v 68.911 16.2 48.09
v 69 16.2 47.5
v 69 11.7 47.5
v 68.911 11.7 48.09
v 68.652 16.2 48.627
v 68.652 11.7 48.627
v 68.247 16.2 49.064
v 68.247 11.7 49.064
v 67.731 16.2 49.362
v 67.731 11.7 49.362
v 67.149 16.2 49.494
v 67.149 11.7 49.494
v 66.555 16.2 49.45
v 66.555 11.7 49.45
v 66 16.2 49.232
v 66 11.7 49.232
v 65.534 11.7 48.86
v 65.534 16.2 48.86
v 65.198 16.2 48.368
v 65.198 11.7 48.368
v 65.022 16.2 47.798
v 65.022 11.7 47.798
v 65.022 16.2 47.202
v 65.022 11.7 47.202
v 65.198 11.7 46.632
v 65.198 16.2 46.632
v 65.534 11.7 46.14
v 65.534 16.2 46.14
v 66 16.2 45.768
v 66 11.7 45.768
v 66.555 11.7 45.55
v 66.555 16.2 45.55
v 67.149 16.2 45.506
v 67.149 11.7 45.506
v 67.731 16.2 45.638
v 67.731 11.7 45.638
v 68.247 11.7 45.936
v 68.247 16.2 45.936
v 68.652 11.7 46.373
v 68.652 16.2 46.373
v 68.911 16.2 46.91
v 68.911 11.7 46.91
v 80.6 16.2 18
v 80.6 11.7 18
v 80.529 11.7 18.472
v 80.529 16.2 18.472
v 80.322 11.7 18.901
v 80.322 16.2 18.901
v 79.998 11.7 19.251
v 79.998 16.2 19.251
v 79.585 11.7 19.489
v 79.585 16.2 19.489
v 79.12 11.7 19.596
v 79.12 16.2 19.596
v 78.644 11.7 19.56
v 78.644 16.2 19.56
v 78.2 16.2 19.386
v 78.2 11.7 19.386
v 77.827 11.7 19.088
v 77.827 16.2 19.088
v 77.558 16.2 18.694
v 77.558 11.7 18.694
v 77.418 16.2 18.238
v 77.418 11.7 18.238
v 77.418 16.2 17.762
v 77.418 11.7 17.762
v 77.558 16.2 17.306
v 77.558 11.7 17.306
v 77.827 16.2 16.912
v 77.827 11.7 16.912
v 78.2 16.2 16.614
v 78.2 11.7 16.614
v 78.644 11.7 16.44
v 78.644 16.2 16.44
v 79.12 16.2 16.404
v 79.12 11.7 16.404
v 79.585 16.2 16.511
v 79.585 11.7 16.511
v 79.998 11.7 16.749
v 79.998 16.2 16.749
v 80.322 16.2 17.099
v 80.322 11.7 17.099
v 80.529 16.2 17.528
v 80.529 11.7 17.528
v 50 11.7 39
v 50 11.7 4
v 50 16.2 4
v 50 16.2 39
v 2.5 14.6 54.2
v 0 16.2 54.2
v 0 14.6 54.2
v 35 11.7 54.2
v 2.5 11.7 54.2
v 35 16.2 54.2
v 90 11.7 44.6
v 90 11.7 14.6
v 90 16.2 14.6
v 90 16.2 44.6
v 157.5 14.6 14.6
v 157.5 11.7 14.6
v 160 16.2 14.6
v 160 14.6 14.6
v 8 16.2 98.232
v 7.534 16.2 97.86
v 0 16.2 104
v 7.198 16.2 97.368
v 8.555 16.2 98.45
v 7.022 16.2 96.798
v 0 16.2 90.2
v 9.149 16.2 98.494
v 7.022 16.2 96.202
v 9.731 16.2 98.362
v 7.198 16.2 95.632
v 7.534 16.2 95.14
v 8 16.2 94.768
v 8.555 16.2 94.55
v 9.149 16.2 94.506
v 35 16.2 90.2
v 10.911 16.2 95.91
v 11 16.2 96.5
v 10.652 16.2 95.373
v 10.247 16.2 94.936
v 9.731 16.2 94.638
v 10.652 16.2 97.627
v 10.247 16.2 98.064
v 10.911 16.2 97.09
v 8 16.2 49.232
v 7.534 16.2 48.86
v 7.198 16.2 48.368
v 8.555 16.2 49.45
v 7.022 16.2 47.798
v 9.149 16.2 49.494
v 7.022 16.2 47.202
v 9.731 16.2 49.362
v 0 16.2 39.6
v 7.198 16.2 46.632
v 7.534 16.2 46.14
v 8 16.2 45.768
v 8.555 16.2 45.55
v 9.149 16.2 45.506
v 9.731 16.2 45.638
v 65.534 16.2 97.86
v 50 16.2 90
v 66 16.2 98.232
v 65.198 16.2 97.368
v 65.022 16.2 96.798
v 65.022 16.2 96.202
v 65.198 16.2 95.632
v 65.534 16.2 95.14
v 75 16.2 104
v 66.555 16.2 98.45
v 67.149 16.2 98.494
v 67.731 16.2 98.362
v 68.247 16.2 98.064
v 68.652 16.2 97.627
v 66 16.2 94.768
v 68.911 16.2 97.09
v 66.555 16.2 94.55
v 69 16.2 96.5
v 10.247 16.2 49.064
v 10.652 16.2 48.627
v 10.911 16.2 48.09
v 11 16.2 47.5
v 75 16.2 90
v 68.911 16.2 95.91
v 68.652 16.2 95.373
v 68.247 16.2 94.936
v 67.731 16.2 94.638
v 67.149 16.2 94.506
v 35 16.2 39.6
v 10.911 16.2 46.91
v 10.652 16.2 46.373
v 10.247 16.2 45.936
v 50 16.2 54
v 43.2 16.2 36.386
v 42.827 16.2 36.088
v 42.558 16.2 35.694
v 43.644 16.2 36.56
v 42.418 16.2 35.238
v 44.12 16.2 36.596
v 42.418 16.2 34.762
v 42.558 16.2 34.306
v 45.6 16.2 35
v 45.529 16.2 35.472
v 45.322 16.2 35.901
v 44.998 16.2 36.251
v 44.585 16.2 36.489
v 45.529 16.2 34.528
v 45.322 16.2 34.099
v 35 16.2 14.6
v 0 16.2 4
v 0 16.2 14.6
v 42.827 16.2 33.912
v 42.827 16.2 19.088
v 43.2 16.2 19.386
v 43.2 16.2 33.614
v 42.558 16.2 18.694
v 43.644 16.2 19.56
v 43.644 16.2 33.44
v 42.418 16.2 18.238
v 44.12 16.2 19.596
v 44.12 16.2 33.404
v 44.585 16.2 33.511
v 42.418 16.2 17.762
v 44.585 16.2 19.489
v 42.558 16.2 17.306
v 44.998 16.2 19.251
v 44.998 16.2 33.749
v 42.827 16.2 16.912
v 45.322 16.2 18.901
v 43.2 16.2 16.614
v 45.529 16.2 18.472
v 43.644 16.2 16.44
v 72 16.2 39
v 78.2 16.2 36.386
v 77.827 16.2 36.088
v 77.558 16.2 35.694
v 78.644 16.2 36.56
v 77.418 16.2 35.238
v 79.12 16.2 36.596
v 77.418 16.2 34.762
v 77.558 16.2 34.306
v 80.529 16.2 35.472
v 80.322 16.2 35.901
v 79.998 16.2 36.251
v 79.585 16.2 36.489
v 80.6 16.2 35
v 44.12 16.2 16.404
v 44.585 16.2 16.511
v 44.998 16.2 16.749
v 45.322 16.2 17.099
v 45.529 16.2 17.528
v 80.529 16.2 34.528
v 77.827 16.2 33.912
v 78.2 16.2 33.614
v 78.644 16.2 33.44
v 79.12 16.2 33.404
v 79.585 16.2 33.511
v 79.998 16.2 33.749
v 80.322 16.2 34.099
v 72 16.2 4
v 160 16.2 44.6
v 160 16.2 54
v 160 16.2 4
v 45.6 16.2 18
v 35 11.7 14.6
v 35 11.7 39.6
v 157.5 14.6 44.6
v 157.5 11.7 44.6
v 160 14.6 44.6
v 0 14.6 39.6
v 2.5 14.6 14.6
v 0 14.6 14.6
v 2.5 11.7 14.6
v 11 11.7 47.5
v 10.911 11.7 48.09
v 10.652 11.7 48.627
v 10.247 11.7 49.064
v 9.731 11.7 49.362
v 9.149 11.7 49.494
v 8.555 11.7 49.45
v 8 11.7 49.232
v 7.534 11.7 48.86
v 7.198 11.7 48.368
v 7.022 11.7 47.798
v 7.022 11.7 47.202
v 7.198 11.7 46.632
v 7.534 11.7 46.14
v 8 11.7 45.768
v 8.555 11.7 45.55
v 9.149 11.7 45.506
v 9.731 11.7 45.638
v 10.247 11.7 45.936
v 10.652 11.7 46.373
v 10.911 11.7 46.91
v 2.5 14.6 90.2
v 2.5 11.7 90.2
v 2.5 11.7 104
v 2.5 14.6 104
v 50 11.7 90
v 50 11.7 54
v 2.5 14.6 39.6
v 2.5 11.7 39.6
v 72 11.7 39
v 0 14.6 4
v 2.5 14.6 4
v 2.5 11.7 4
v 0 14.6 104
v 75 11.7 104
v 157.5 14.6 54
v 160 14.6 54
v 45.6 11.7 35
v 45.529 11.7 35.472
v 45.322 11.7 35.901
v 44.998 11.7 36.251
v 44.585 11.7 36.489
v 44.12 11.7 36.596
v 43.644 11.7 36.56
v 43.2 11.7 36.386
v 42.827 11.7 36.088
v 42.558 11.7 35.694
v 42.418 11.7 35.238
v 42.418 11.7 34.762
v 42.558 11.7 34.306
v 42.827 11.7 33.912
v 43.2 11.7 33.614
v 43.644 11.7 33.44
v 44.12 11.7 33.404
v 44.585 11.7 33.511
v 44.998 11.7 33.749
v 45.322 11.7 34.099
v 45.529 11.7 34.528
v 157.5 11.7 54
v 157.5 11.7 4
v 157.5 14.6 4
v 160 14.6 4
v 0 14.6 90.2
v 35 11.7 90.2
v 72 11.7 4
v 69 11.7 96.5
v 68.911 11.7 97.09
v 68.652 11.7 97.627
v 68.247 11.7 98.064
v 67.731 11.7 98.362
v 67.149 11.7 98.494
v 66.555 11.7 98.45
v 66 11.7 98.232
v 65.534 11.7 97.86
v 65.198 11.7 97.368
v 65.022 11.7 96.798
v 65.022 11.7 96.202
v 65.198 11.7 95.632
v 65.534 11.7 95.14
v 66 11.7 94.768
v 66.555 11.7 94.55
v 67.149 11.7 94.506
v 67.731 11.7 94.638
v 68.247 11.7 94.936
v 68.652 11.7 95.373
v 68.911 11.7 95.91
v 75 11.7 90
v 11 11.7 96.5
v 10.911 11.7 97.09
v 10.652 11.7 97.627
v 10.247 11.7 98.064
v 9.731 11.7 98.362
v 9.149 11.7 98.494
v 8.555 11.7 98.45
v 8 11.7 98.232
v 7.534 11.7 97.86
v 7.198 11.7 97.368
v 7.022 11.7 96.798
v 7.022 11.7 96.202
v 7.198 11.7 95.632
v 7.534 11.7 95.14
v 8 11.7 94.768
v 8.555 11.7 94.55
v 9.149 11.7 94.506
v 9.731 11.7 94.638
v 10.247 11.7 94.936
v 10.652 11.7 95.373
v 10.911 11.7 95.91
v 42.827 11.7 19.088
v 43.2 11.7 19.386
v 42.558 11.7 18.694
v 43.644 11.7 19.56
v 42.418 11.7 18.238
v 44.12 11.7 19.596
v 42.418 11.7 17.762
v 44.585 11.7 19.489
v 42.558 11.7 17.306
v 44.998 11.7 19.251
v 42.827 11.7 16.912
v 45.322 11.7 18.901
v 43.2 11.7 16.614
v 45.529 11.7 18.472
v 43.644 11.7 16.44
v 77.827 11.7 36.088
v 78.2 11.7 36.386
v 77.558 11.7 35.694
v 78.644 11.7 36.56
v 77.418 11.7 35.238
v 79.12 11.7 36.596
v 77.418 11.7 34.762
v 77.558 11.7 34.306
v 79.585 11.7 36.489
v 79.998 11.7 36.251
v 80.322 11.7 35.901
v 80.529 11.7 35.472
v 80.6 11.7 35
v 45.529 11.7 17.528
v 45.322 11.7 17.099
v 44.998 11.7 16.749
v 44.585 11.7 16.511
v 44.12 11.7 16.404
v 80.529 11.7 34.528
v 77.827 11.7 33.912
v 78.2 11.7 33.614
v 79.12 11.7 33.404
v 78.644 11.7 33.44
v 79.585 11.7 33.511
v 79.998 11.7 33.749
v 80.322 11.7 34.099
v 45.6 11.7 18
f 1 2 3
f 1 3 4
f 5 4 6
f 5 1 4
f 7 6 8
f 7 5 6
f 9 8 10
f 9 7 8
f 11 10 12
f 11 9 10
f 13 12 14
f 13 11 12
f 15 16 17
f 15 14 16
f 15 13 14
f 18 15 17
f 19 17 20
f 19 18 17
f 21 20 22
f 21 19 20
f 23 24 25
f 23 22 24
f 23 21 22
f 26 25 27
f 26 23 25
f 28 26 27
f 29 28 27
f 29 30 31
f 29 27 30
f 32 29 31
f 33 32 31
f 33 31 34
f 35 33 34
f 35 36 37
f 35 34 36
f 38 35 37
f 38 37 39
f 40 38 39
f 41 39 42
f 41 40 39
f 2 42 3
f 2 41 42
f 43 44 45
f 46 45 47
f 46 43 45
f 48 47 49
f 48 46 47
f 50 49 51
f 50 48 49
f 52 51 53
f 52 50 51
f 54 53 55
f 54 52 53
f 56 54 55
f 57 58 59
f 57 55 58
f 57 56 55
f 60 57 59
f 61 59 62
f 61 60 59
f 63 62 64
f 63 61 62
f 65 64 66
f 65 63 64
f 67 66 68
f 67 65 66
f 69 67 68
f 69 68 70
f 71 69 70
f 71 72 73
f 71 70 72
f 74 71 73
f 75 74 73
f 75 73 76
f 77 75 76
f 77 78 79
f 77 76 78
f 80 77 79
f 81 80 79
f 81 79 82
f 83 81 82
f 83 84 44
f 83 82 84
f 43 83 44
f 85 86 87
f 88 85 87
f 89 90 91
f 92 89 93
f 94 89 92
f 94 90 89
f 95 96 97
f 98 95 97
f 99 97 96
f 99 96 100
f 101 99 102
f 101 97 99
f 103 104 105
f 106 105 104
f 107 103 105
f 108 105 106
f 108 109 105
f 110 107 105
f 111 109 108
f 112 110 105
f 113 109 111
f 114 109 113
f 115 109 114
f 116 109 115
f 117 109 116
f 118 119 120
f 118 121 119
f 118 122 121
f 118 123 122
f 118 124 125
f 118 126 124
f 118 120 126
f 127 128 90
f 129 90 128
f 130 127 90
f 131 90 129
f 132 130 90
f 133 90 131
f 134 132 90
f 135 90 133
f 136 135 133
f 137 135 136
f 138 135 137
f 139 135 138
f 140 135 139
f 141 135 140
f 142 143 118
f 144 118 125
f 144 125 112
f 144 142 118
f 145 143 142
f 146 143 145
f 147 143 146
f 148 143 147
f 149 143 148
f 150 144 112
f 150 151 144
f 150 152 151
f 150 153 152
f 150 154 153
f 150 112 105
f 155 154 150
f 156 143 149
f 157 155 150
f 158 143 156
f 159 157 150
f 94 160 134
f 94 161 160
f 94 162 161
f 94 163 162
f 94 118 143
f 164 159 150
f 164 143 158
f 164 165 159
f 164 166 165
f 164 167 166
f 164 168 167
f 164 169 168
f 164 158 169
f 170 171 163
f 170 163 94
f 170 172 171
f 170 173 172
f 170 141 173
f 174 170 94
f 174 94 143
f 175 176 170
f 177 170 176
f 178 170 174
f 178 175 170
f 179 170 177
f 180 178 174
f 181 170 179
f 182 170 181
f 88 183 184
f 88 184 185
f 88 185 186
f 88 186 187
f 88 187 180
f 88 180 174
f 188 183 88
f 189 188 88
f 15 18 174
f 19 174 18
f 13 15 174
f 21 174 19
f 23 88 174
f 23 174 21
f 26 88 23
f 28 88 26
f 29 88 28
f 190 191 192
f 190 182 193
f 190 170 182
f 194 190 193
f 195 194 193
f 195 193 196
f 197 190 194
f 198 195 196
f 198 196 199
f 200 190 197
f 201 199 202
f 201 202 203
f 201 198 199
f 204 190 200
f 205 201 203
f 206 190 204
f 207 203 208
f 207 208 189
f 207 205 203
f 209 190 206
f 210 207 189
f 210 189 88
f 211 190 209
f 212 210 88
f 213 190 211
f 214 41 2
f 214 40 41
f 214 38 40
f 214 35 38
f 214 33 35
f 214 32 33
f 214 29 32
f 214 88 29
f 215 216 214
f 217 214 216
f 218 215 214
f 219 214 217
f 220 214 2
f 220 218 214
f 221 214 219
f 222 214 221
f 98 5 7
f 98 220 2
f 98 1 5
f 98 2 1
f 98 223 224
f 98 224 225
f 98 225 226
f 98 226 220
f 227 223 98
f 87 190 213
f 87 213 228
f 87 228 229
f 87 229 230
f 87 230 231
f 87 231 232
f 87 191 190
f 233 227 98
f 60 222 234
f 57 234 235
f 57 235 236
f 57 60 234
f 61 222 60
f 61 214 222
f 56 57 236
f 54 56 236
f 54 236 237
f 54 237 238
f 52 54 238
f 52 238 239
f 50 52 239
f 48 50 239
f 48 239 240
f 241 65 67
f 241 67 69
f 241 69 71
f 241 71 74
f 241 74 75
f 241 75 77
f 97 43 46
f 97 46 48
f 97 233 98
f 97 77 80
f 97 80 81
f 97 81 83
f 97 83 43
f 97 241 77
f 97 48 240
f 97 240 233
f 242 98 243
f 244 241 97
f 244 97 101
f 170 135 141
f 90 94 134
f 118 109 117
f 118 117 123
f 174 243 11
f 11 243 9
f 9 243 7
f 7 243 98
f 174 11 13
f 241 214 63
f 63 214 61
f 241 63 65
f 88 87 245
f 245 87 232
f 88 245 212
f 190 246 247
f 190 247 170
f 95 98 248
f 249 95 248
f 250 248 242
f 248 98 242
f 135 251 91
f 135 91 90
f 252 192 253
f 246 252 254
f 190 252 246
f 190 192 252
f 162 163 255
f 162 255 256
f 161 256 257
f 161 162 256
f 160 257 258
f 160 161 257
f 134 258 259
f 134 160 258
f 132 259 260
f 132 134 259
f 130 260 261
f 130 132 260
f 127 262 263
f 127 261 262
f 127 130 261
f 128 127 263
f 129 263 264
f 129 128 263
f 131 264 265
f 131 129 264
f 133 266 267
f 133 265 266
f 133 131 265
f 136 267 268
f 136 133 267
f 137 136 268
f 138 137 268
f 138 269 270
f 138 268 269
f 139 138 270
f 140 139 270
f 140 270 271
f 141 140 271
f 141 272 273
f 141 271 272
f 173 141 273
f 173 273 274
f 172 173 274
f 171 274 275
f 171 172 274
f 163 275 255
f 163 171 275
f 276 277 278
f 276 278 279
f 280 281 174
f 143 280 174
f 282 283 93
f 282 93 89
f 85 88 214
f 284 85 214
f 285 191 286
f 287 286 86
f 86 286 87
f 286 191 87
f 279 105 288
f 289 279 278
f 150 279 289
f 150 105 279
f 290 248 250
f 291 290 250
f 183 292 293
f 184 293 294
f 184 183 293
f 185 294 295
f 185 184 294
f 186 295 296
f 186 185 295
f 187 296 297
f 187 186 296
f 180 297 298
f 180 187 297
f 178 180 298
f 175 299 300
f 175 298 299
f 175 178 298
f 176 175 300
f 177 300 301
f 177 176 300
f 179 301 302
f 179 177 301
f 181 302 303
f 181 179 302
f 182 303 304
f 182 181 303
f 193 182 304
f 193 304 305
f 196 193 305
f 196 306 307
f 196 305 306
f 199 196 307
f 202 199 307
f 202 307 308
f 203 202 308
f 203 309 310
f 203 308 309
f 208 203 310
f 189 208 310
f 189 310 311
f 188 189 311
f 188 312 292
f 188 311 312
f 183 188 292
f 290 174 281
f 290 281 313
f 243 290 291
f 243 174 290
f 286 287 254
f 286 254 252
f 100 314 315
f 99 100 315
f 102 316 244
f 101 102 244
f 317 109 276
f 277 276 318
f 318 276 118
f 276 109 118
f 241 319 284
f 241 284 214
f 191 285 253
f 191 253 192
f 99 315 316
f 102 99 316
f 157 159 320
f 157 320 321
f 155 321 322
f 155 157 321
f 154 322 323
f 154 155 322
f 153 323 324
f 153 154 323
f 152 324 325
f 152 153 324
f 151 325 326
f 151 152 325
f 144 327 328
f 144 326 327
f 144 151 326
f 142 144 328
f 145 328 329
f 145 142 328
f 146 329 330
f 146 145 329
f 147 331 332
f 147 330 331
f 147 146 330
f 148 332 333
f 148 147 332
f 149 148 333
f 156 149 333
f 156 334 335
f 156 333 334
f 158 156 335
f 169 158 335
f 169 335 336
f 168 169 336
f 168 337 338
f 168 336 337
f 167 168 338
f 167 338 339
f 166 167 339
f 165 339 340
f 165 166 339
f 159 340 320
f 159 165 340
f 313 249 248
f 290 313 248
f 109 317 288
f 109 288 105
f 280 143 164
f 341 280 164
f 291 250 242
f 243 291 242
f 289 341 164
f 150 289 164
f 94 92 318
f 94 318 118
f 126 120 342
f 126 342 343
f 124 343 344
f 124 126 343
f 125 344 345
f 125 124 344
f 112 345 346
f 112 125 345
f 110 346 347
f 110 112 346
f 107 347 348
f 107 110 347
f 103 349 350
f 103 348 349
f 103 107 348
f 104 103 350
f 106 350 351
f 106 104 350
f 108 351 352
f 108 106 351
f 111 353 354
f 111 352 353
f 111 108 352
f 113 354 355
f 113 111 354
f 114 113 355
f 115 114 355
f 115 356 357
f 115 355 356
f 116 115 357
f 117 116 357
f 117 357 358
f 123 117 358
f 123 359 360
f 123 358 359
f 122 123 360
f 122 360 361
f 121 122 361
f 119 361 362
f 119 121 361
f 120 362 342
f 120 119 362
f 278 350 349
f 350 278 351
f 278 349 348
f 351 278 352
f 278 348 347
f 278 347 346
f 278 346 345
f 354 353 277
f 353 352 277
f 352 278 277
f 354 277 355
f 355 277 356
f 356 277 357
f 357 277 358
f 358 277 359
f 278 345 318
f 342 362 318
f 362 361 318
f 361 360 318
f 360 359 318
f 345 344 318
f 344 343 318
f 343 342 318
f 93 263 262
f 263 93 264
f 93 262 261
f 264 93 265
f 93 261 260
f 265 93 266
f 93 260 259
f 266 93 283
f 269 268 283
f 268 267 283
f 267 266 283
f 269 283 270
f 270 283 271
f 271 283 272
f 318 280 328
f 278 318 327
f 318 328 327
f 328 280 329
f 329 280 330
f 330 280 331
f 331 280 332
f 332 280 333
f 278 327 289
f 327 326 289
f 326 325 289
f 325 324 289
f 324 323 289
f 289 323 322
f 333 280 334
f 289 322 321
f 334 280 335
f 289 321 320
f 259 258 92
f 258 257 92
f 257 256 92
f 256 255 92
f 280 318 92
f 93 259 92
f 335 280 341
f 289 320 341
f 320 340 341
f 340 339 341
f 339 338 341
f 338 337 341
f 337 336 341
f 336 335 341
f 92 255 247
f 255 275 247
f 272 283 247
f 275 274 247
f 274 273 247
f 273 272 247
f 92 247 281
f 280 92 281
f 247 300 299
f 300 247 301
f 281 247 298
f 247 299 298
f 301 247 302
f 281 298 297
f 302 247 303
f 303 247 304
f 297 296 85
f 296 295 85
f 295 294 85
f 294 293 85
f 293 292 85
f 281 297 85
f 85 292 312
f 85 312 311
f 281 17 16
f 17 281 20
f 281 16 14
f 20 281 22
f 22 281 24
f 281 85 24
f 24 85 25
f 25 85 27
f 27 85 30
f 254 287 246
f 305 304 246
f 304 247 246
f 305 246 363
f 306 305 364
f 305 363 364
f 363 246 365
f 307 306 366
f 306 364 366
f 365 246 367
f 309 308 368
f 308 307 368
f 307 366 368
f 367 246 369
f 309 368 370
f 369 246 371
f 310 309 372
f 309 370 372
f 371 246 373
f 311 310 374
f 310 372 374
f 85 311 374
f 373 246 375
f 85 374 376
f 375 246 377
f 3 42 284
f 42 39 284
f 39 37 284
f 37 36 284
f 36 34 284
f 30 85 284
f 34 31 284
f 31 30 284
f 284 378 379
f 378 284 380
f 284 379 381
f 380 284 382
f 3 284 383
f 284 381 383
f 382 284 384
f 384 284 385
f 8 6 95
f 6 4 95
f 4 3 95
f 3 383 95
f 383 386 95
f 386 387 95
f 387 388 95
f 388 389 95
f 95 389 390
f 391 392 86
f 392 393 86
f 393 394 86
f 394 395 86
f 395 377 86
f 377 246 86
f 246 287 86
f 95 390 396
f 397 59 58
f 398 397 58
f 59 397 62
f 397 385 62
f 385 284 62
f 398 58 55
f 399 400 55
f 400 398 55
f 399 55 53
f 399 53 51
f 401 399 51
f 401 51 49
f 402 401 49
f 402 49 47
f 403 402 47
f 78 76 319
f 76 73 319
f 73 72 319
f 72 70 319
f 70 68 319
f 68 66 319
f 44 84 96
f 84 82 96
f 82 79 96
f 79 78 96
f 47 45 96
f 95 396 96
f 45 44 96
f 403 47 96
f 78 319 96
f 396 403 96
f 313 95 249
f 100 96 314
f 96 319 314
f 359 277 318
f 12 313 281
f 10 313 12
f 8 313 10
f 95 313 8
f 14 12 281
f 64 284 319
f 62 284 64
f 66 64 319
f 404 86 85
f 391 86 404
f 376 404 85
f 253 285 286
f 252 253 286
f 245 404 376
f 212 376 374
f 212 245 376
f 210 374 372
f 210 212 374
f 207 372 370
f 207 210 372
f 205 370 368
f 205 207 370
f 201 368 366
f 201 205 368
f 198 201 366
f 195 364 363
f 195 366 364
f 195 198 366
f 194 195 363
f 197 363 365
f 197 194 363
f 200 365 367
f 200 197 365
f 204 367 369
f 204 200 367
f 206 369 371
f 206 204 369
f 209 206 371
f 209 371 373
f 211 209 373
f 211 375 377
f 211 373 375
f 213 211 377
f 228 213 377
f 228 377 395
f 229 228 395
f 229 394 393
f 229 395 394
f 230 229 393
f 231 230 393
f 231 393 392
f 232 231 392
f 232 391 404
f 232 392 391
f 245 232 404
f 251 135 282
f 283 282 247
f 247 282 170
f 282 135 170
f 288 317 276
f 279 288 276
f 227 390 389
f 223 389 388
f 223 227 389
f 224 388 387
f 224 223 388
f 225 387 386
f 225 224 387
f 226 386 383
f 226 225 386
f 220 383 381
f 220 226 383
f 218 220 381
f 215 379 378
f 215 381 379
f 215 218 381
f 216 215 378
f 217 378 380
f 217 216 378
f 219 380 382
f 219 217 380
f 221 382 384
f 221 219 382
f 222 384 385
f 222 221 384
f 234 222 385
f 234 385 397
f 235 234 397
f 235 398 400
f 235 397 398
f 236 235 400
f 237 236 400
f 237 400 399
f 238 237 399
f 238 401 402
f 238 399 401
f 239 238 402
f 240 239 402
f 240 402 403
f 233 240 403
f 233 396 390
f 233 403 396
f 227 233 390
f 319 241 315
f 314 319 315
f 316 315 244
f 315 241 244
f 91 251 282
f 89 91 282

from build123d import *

# Parameters (mm, degrees)
BOX005_W          = 70
BOX005_H          = 10
BOX005_DEPTH      = 30
BOX006_W          = 35
BOX006_H          = 10
BOX006_DEPTH      = 25
BOX007_W          = 35
BOX007_H          = 10
BOX007_DEPTH      = 36
BOX008_W          = 85
BOX008_H          = 10
BOX008_DEPTH      = 50
BOX009_W          = 22
BOX009_H          = 10
BOX009_DEPTH      = 35
BOX004_W          = 110
BOX004_H          = 10
BOX004_DEPTH      = 36
CYLINDER008_R     = 2
CYLINDER008_DEPTH = 10
CYLINDER009_R     = 2
CYLINDER009_DEPTH = 10
CYLINDER010_R     = 2
CYLINDER010_DEPTH = 10
CYLINDER011_R     = 2
CYLINDER011_DEPTH = 10
CYLINDER005_R     = 1.6
CYLINDER005_DEPTH = 10
CYLINDER007_R     = 1.6
CYLINDER007_DEPTH = 10
CYLINDER004_R     = 1.6
CYLINDER004_DEPTH = 10
CYLINDER006_R     = 1.6
CYLINDER006_DEPTH = 10
BOX_W             = 160
BOX_H             = 1.6
BOX_DEPTH         = 100
BOX001_W          = 155
BOX001_H          = 2.9
BOX001_DEPTH      = 100


with BuildPart() as cuts002:
    # Box005 → Box005 (new body)
    with BuildSketch(Plane(origin=(90, 10, 14.6), x_dir=(1, 0, 0), z_dir=(0, 0, 1))):
        with Locations((35, 5)):
            Rectangle(BOX005_W, BOX005_H)
    extrude(amount=BOX005_DEPTH)


with BuildPart() as cuts003:
    # Box006 → Box006 (new body)
    with BuildSketch(Plane(origin=(0, 10, 14.6), x_dir=(1, 0, 0), z_dir=(0, 0, 1))):
        with Locations((17.5, 5)):
            Rectangle(BOX006_W, BOX006_H)
    extrude(amount=BOX006_DEPTH)


with BuildPart() as cuts004:
    # Box007 → Box007 (new body)
    with BuildSketch(Plane(origin=(0, 10, 54.2), x_dir=(1, 0, 0), z_dir=(0, 0, 1))):
        with Locations((17.5, 5)):
            Rectangle(BOX007_W, BOX007_H)
    extrude(amount=BOX007_DEPTH)


with BuildPart() as cuts005:
    # Box008 → Box008 (new body)
    with BuildSketch(Plane(origin=(75, 10, 54), x_dir=(1, 0, 0), z_dir=(0, 0, 1))):
        with Locations((42.5, 5)):
            Rectangle(BOX008_W, BOX008_H)
    extrude(amount=BOX008_DEPTH)


with BuildPart() as cuts006:
    # Box009 → Box009 (new body)
    with BuildSketch(Plane(origin=(50, 10, 4), x_dir=(1, 0, 0), z_dir=(0, 0, 1))):
        with Locations((11, 5)):
            Rectangle(BOX009_W, BOX009_H)
    extrude(amount=BOX009_DEPTH)


with BuildPart() as cuts:
    # Box004 → Box004 (new body)
    with BuildSketch(Plane(origin=(50, 10, 54), x_dir=(1, 0, 0), z_dir=(0, 0, 1))):
        with Locations((55, 5)):
            Rectangle(BOX004_W, BOX004_H)
    extrude(amount=BOX004_DEPTH)

    # Fusion005: union cuts002, cuts003, cuts004, cuts005, cuts006
    add(cuts002.part)
    add(cuts003.part)
    add(cuts004.part)
    add(cuts005.part)
    add(cuts006.part)


with BuildPart() as m2s008:
    # Cylinder008 → Cylinder008 (new body)
    with BuildSketch(Plane(origin=(9, 0, 47.5), x_dir=(1, 0, 0), z_dir=(0, -1, 0))):
        Circle(CYLINDER008_R)
    extrude(amount=CYLINDER008_DEPTH)


with BuildPart() as m2s009:
    # Cylinder009 → Cylinder009 (new body)
    with BuildSketch(Plane(origin=(67, 0, 47.5), x_dir=(1, 0, 0), z_dir=(0, -1, 0))):
        Circle(CYLINDER009_R)
    extrude(amount=CYLINDER009_DEPTH)


with BuildPart() as m2s010:
    # Cylinder010 → Cylinder010 (new body)
    with BuildSketch(Plane(origin=(67, 0, 96.5), x_dir=(1, 0, 0), z_dir=(0, -1, 0))):
        Circle(CYLINDER010_R)
    extrude(amount=CYLINDER010_DEPTH)


with BuildPart() as c1cuts:
    # Cylinder011 → Cylinder011 (new body)
    with BuildSketch(Plane(origin=(9, 0, 96.5), x_dir=(1, 0, 0), z_dir=(0, -1, 0))):
        Circle(CYLINDER011_R)
    extrude(amount=CYLINDER011_DEPTH)

    # Fusion003: union m2s008, m2s009, m2s010
    add(m2s008.part)
    add(m2s009.part)
    add(m2s010.part)


with BuildPart() as c1cuts_1:
    # Fusion003 placement: moved
    add(c1cuts.part.moved(Location((0, 16.4, 0))))


with BuildPart() as m2s005:
    # Cylinder005 → Cylinder005 (new body)
    with BuildSketch(Plane(origin=(14, 0, 20), x_dir=(1, 0, 0), z_dir=(0, -1, 0))):
        Circle(CYLINDER005_R)
    extrude(amount=CYLINDER005_DEPTH)


with BuildPart() as m2s007:
    # Cylinder007 → Cylinder007 (new body)
    with BuildSketch(Plane(origin=(49, 0, 20), x_dir=(1, 0, 0), z_dir=(0, -1, 0))):
        Circle(CYLINDER007_R)
    extrude(amount=CYLINDER007_DEPTH)


with BuildPart() as m2s004:
    # Cylinder004 → Cylinder004 (new body)
    with BuildSketch(Plane(origin=(49, 0, 3), x_dir=(1, 0, 0), z_dir=(0, -1, 0))):
        Circle(CYLINDER004_R)
    extrude(amount=CYLINDER004_DEPTH)


with BuildPart() as basecuts:
    # Cylinder006 → Cylinder006 (new body)
    with BuildSketch(Plane(origin=(14, 0, 3), x_dir=(1, 0, 0), z_dir=(0, -1, 0))):
        Circle(CYLINDER006_R)
    extrude(amount=CYLINDER006_DEPTH)

    # Fusion002: union m2s005, m2s007, m2s004
    add(m2s005.part)
    add(m2s007.part)
    add(m2s004.part)


with BuildPart() as basecuts_1:
    # Fusion002 placement: moved
    add(basecuts.part.moved(Location((30, 16.2, 15))))

    # Fusion004: union c1Cuts
    add(c1cuts_1.part)


with BuildPart() as base:
    # Box → Box (new body)
    with BuildSketch(Plane(origin=(0, 14.6, 4), x_dir=(1, 0, 0), z_dir=(0, 0, 1))):
        with Locations((80, 0.8)):
            Rectangle(BOX_W, BOX_H)
    extrude(amount=BOX_DEPTH)


with BuildPart() as cut002:
    # Box001 → Box001 (new body)
    with BuildSketch(Plane(origin=(2.5, 11.7, 4), x_dir=(1, 0, 0), z_dir=(0, 0, 1))):
        with Locations((77.5, 1.45)):
            Rectangle(BOX001_W, BOX001_H)
    extrude(amount=BOX001_DEPTH)

    # Fusion001: union base
    add(base.part)

    # Cut001: cut baseCuts
    add(basecuts_1.part, mode=Mode.SUBTRACT)

    # Cut002: cut cuts
    add(cuts.part, mode=Mode.SUBTRACT)


solid = cut002.part
